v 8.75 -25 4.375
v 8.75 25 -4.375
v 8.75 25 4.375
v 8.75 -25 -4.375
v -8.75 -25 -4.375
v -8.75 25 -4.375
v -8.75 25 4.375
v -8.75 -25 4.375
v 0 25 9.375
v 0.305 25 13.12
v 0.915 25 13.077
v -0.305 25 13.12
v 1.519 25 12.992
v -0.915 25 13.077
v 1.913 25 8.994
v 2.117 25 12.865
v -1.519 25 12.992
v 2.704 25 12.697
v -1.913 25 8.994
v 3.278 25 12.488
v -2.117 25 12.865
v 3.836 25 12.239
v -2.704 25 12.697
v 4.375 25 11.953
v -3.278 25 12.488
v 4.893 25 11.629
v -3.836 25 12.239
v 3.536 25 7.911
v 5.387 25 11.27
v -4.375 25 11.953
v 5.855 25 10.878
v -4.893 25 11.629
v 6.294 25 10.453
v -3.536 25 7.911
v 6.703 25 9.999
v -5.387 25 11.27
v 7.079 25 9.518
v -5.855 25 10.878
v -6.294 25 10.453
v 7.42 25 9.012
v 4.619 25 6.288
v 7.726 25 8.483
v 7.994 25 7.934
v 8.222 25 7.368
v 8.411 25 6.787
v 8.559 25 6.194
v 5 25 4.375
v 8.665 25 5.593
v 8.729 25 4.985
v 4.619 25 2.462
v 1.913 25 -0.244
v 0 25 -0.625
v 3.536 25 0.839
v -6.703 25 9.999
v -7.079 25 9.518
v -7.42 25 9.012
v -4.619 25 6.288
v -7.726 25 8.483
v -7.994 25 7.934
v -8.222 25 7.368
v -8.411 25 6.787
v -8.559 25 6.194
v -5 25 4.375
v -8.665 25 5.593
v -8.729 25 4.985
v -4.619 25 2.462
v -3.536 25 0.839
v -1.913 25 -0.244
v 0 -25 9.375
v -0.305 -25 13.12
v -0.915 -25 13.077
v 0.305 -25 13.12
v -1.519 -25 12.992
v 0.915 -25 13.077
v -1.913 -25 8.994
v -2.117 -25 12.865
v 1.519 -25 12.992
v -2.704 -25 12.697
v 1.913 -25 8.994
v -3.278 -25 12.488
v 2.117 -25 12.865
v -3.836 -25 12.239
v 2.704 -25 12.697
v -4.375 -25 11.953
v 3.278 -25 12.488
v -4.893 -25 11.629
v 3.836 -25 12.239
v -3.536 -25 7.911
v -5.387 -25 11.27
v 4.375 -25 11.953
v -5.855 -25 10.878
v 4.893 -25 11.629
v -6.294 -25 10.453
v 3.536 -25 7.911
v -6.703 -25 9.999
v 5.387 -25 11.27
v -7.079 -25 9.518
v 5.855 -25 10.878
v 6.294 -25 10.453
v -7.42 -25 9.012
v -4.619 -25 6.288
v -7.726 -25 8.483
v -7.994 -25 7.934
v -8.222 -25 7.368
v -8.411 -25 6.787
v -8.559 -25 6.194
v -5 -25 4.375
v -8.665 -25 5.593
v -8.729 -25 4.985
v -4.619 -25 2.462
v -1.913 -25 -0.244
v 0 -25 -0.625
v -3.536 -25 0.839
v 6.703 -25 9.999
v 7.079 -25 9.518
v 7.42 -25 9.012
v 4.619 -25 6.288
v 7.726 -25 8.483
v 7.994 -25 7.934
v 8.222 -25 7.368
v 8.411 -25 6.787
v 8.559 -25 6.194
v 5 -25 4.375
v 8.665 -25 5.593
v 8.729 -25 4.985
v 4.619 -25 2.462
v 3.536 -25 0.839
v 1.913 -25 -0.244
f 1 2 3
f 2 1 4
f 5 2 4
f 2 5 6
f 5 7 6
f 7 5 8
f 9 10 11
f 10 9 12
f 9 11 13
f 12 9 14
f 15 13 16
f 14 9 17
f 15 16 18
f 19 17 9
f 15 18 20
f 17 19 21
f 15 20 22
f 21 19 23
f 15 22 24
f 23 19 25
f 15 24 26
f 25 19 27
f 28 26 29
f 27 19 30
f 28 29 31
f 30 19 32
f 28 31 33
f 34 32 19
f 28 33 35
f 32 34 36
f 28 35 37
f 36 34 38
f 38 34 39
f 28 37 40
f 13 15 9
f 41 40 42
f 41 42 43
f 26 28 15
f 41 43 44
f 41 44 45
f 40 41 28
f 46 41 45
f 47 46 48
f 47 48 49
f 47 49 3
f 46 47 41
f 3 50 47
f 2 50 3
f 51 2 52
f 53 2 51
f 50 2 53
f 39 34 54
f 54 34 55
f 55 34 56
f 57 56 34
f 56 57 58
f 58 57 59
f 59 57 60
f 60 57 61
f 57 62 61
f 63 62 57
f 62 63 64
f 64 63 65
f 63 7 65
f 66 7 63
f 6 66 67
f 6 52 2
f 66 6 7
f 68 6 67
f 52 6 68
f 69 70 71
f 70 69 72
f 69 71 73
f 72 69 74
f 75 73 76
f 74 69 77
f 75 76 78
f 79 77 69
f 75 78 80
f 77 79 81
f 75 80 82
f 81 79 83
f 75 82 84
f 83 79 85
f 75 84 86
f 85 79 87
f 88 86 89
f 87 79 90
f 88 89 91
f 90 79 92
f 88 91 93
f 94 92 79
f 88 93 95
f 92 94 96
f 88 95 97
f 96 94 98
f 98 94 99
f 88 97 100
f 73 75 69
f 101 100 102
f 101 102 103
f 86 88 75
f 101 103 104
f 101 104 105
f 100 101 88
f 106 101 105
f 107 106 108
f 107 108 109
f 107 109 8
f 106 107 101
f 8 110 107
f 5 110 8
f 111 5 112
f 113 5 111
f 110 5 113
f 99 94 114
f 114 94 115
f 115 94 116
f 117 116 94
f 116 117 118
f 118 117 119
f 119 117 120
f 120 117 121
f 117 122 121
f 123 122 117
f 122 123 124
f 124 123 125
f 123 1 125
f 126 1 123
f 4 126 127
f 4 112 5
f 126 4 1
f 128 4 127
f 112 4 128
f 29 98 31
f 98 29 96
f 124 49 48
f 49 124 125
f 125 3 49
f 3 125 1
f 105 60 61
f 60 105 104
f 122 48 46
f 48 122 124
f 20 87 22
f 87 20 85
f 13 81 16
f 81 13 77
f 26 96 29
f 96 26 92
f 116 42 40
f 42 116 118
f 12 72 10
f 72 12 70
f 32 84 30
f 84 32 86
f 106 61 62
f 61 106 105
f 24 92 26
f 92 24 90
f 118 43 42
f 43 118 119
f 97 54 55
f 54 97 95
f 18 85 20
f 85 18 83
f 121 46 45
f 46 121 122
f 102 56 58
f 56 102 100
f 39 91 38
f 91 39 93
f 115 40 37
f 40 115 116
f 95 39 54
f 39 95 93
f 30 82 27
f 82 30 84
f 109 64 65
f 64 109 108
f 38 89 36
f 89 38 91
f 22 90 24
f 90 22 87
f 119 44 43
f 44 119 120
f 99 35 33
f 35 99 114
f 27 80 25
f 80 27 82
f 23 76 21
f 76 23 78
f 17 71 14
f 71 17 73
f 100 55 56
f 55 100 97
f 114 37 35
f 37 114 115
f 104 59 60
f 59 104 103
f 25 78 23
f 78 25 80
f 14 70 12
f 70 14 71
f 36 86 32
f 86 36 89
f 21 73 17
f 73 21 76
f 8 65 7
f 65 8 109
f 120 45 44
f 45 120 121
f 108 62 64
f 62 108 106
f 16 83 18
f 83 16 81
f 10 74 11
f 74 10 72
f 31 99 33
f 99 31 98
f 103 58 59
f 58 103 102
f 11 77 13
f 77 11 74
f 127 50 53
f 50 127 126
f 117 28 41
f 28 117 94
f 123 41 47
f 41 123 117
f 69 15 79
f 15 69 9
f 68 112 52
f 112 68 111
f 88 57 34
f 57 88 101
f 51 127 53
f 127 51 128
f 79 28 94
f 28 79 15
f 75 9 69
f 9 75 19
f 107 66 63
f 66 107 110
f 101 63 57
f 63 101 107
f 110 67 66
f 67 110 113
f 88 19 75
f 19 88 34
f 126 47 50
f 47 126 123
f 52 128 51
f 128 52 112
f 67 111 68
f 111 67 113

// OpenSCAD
/* 
 * Telebot 1.1
 * Copyright (c) 2015-2016 by Paul-Louis Ageneau
 *
 * This program is free software: you can redistribute it and/or modify
 * it under the terms of the GNU General Public License as published by
 * the Free Software Foundation, either version 3 of the License, or
 * (at your option) any later version.
 *
 * This program is distributed in the hope that it will be useful,
 * but WITHOUT ANY WARRANTY; without even the implied warranty of
 * MERCHANTABILITY or FITNESS FOR A PARTICULAR PURPOSE.  See the
 * GNU General Public License for more details.
 *
 * You should have received a copy of the GNU General Public License
 * along with this program.  If not, see <http://www.gnu.org/licenses/>.
 */

// Shaft coupling (optional)
 
axis_radius = 5;
width = axis_radius*2 + 7.5;
depth = 50;

difference() {
    union() {
        cube([width, depth, width/2], center = true);
        translate([0, 0, width/4]) rotate([90, 0, 0]) cylinder(h = depth, r=width/2, center=true, $fn = 90);
    }
    translate([0, 0, width/4]) rotate([90, 0, 0]) cylinder(h = depth+10, r=axis_radius, center=true);
}
